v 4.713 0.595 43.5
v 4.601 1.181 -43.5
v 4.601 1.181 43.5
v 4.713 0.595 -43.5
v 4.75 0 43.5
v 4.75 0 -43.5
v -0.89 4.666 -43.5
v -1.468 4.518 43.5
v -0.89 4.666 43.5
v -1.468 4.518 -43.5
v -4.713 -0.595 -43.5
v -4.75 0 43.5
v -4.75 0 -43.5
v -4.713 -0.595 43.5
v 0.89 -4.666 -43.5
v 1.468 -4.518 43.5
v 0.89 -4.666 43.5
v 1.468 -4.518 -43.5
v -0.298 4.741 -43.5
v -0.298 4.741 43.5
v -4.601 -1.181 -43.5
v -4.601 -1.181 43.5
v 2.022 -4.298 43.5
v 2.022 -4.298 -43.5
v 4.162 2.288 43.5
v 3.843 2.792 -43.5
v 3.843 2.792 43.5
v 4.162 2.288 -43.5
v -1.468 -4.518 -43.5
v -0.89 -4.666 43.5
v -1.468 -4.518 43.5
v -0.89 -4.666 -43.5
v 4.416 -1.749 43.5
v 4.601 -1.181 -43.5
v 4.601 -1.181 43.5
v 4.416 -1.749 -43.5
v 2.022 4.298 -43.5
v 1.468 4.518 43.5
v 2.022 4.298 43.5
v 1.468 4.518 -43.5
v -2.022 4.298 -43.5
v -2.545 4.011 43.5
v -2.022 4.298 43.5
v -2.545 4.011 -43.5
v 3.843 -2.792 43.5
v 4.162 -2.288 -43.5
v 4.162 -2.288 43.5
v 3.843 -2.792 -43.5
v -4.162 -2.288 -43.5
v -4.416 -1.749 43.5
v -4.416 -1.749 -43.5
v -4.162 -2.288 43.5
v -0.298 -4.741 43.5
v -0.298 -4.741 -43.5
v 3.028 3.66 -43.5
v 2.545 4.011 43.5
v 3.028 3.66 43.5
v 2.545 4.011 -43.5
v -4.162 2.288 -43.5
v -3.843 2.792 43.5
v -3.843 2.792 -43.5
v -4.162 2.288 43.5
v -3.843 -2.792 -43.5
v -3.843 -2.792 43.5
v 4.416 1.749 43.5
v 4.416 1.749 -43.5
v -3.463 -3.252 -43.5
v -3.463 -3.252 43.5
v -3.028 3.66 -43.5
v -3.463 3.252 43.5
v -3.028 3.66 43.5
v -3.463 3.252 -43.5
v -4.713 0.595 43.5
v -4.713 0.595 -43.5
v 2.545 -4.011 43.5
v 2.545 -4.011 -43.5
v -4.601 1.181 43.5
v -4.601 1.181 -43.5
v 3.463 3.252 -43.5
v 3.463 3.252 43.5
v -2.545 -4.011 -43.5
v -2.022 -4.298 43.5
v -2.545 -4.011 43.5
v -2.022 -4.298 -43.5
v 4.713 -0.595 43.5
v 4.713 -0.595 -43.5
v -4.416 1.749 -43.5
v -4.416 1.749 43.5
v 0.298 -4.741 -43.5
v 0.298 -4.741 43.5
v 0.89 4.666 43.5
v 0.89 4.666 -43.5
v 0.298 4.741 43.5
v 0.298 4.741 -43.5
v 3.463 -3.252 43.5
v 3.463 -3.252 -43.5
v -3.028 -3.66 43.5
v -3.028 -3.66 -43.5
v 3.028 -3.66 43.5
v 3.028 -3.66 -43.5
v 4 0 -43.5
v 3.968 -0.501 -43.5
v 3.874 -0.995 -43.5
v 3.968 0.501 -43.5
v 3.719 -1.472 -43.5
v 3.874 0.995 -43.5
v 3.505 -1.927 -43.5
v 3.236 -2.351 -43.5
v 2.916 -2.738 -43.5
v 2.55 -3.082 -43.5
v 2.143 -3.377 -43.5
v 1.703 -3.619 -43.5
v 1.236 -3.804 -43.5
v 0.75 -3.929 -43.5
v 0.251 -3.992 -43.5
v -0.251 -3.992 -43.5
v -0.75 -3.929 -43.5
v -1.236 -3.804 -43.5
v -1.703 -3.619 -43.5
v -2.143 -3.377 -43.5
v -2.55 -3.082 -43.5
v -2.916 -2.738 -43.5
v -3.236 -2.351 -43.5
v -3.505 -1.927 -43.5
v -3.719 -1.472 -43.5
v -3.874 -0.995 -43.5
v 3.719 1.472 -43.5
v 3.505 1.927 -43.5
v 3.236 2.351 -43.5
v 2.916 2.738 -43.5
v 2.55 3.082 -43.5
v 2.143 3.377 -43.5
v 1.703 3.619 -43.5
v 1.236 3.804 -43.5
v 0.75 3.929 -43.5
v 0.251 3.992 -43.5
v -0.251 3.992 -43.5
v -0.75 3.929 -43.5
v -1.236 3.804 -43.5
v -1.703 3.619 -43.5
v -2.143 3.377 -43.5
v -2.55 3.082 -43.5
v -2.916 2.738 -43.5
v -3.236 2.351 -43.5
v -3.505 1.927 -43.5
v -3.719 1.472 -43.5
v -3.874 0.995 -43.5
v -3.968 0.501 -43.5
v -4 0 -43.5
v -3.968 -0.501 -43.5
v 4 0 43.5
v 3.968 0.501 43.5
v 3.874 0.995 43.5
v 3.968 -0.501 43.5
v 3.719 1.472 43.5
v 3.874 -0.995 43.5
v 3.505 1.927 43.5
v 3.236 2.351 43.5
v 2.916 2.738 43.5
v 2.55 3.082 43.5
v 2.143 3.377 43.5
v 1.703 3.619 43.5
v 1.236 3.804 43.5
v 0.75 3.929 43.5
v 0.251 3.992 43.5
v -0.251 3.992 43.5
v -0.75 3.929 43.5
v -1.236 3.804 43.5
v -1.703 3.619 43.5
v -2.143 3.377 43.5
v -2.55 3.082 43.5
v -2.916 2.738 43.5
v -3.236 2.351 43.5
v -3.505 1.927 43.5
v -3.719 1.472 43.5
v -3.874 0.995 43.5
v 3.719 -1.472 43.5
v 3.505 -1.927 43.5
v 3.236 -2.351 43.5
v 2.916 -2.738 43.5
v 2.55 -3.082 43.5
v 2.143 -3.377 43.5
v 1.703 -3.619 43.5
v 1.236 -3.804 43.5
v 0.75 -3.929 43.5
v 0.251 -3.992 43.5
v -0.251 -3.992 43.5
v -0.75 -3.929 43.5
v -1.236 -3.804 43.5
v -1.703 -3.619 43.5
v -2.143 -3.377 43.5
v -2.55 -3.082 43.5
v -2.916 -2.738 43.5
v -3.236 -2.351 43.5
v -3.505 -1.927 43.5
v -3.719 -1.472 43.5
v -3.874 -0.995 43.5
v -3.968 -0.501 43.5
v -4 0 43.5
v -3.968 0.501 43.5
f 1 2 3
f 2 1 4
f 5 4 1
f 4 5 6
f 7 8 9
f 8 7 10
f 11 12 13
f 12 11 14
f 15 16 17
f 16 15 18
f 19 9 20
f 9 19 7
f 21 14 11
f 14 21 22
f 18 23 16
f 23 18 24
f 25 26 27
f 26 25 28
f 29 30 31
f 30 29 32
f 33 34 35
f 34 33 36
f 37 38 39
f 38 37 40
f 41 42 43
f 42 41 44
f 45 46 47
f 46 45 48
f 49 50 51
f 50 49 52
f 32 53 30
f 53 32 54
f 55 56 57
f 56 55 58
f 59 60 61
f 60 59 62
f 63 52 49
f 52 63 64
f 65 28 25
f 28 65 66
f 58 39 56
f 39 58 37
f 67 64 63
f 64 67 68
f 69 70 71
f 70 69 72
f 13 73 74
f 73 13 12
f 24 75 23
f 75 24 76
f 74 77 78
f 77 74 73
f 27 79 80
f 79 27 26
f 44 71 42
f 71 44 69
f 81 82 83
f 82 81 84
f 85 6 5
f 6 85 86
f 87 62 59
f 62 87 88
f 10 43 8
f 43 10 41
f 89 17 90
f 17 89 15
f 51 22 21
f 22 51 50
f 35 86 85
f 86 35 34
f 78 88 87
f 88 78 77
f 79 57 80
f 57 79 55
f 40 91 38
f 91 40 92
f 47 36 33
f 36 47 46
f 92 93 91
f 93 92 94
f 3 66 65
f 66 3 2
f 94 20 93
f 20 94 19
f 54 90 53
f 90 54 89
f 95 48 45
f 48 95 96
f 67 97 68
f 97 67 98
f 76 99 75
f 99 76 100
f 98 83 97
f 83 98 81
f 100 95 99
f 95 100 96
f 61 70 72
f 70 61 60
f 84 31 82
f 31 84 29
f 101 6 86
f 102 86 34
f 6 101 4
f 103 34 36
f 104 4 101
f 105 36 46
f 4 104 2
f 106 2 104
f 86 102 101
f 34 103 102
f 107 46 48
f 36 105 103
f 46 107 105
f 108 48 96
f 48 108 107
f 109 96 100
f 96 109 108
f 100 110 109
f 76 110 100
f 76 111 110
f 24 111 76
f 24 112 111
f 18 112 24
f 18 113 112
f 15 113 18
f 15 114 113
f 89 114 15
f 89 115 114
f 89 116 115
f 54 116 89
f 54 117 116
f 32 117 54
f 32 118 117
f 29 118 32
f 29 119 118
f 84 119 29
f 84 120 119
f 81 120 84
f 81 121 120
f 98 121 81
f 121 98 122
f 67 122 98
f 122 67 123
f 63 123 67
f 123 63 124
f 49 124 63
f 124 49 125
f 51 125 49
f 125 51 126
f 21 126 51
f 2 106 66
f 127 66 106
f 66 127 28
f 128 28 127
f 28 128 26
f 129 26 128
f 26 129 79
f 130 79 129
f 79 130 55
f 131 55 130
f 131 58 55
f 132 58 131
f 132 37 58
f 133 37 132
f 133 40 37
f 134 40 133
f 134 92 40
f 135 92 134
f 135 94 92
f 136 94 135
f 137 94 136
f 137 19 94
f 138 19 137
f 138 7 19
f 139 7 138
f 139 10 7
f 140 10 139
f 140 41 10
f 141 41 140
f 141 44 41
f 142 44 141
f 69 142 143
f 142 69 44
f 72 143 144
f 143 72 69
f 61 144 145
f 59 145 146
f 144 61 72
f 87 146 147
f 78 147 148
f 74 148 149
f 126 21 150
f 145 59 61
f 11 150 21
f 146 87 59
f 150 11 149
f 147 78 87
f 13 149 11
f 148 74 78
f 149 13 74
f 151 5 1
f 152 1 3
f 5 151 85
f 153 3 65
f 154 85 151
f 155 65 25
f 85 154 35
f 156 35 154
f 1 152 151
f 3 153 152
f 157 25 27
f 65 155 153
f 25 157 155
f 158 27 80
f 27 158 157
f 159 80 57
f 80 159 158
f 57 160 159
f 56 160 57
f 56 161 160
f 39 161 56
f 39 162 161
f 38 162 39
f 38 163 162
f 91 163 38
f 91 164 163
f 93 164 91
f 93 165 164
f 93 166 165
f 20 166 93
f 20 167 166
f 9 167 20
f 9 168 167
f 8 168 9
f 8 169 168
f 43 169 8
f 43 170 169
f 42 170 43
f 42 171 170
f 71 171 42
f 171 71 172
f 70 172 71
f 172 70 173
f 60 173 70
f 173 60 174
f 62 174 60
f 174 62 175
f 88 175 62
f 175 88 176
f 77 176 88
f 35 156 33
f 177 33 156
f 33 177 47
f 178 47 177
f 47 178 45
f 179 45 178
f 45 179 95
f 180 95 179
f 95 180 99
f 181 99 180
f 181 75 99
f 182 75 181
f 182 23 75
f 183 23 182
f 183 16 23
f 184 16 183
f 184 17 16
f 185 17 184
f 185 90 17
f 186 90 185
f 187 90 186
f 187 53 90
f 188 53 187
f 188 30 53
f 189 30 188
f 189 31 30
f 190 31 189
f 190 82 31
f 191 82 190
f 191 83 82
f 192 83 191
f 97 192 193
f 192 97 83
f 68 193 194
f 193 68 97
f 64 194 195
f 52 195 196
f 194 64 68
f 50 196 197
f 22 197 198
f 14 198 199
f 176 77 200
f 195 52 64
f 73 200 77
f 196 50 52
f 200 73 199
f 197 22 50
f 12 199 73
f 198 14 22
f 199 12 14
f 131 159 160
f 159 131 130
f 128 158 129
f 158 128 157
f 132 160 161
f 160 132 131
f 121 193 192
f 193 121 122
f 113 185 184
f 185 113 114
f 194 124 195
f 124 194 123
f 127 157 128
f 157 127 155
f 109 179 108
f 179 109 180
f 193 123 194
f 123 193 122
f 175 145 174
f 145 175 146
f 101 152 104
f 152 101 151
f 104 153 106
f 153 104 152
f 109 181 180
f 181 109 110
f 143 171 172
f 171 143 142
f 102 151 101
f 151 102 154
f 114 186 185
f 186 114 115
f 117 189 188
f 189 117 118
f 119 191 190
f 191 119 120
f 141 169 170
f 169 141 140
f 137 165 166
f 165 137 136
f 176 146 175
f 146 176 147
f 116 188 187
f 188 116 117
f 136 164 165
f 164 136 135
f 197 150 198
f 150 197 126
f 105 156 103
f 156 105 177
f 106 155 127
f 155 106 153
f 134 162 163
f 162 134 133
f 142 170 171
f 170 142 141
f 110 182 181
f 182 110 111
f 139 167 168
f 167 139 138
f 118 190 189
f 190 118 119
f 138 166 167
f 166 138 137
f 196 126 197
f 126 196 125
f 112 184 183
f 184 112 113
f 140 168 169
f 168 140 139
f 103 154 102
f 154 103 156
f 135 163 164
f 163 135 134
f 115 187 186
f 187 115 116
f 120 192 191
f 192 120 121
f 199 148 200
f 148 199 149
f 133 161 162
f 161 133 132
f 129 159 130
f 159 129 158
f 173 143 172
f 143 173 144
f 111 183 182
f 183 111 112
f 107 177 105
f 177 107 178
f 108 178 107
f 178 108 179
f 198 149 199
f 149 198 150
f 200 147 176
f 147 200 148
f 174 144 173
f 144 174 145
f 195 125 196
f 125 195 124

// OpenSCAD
$fn = 50;


difference() {
	union() {
		translate(v = [0, 0, -43.5000000000]) {
			cylinder(h = 87, r = 4.7500000000);
		}
	}
	union() {
		translate(v = [0, 0, -100.0000000000]) {
			cylinder(h = 200, r = 4.0000000000);
		}
	}
}
